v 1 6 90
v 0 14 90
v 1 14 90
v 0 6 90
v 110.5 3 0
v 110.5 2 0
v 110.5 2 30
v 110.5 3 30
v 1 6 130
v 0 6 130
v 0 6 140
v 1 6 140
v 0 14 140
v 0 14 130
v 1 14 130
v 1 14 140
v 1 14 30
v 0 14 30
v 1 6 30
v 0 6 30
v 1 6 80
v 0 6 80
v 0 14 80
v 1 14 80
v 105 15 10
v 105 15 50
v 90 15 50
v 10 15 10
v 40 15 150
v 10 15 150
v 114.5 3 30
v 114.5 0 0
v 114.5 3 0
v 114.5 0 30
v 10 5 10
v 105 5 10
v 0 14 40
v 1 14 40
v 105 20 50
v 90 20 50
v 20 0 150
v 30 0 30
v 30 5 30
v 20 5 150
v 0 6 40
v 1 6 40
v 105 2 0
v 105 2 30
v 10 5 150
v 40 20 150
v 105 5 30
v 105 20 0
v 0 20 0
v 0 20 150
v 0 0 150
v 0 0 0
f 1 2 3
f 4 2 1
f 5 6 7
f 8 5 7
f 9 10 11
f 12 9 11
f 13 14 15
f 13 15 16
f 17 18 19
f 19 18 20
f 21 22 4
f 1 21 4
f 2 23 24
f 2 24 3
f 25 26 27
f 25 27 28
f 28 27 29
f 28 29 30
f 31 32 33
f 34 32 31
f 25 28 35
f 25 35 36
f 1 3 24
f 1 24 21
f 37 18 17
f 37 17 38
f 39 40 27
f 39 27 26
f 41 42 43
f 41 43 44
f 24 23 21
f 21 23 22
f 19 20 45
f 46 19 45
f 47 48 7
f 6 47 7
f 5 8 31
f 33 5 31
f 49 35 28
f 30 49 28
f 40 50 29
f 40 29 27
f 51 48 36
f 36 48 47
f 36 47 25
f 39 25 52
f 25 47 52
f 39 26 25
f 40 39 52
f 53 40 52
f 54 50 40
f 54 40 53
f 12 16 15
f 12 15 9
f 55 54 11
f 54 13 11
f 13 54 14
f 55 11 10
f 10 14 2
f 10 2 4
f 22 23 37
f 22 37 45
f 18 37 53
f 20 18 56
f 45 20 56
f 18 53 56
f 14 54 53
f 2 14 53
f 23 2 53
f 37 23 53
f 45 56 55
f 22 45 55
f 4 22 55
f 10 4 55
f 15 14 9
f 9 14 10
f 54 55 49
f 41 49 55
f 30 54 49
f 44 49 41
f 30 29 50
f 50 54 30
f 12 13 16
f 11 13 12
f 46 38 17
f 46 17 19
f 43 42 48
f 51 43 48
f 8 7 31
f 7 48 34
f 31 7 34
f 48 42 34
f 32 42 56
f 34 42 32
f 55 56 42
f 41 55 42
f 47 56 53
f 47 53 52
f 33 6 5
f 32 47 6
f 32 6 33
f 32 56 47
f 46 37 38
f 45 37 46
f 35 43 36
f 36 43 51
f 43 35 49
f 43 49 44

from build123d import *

# Parameters (mm, degrees)
F0_W      = 30
F0_H      = 5
F1_DEPTH  = 150
F2_W      = 95
F2_H      = 5
F3_DEPTH  = 30
F4_W      = 10
F4_H      = 5
F5_DEPTH  = 120
F7_DEPTH  = 5
F8_W      = 65
F8_H      = 5
F9_DEPTH  = 50
F11_DEPTH = 5
F12_W     = 95
F12_H     = 10
F13_DEPTH = 10
F14_W     = 5.5
F14_H     = 30
F15_DEPTH = 2
F16_W     = 4
F16_H     = 30
F17_DEPTH = 3
F18_W     = 8
F18_H     = 10
F19_DEPTH = 1


with BuildPart() as f1:
    # F0 (on Top) → F1 (new body)
    with BuildSketch(Plane.XY):
        Polygon((0, 20), (0, 0), (10, 0), (10, 15), (10, 20), align=None)
        with Locations((25, 17.5)):
            Rectangle(F0_W, F0_H)
    extrude(amount=F1_DEPTH)

    # F2 (on Top) → F3 (join)
    with BuildSketch(Plane.XY):
        with Locations((57.5, 2.5)):
            Rectangle(F2_W, F2_H)
    extrude(amount=F3_DEPTH)

    # F4 (on face) → F5 (join)
    with BuildSketch(Plane.XY.offset(30)):
        with Locations((15, 2.5)):
            Rectangle(F4_W, F4_H)
    extrude(amount=F5_DEPTH)

    # F6 (on face) → F7 (join)
    with BuildSketch(Plane.XZ):
        Polygon((30, 30), (20, 150), (20, 30), align=None)
    extrude(amount=-F7_DEPTH)

    # F8 (on Top) → F9 (join)
    with BuildSketch(Plane.XY):
        with Locations((72.5, 17.5)):
            Rectangle(F8_W, F8_H)
    extrude(amount=F9_DEPTH)

    # F10 (on face) → F11 (join)
    with BuildSketch(Plane(origin=(0, 20, 0), x_dir=(-1, 0, 0), z_dir=(0, 1, 0))):
        Polygon((-90, 50), (-40, 50), (-40, 150), align=None)
    extrude(amount=-F11_DEPTH)

    # F12 (on Top) → F13 (join)
    with BuildSketch(Plane.XY):
        with Locations((57.5, 10)):
            Rectangle(F12_W, F12_H)
    extrude(amount=F13_DEPTH)

    # F14 (on face) → F15 (join)
    with BuildSketch(Plane.XZ):
        with Locations((107.75, 15)):
            Rectangle(F14_W, F14_H)
    extrude(amount=-F15_DEPTH)

    # F16 (on face) → F17 (join)
    with BuildSketch(Plane.XZ):
        with Locations((112.5, 15)):
            Rectangle(F16_W, F16_H)
    extrude(amount=-F17_DEPTH)

    # F18 (on face) → F19 (cut)
    with BuildSketch(Plane(origin=(0, 0, 0), x_dir=(0, -1, 0), z_dir=(-1, 0, 0))):
        with Locations((-10, 35)):
            Rectangle(F18_W, F18_H)
        with Locations((-10, 85)):
            Rectangle(F18_W, F18_H)
        with Locations((-10, 135)):
            Rectangle(F18_W, F18_H)
    extrude(amount=-F19_DEPTH, mode=Mode.SUBTRACT)


solid = f1.part
